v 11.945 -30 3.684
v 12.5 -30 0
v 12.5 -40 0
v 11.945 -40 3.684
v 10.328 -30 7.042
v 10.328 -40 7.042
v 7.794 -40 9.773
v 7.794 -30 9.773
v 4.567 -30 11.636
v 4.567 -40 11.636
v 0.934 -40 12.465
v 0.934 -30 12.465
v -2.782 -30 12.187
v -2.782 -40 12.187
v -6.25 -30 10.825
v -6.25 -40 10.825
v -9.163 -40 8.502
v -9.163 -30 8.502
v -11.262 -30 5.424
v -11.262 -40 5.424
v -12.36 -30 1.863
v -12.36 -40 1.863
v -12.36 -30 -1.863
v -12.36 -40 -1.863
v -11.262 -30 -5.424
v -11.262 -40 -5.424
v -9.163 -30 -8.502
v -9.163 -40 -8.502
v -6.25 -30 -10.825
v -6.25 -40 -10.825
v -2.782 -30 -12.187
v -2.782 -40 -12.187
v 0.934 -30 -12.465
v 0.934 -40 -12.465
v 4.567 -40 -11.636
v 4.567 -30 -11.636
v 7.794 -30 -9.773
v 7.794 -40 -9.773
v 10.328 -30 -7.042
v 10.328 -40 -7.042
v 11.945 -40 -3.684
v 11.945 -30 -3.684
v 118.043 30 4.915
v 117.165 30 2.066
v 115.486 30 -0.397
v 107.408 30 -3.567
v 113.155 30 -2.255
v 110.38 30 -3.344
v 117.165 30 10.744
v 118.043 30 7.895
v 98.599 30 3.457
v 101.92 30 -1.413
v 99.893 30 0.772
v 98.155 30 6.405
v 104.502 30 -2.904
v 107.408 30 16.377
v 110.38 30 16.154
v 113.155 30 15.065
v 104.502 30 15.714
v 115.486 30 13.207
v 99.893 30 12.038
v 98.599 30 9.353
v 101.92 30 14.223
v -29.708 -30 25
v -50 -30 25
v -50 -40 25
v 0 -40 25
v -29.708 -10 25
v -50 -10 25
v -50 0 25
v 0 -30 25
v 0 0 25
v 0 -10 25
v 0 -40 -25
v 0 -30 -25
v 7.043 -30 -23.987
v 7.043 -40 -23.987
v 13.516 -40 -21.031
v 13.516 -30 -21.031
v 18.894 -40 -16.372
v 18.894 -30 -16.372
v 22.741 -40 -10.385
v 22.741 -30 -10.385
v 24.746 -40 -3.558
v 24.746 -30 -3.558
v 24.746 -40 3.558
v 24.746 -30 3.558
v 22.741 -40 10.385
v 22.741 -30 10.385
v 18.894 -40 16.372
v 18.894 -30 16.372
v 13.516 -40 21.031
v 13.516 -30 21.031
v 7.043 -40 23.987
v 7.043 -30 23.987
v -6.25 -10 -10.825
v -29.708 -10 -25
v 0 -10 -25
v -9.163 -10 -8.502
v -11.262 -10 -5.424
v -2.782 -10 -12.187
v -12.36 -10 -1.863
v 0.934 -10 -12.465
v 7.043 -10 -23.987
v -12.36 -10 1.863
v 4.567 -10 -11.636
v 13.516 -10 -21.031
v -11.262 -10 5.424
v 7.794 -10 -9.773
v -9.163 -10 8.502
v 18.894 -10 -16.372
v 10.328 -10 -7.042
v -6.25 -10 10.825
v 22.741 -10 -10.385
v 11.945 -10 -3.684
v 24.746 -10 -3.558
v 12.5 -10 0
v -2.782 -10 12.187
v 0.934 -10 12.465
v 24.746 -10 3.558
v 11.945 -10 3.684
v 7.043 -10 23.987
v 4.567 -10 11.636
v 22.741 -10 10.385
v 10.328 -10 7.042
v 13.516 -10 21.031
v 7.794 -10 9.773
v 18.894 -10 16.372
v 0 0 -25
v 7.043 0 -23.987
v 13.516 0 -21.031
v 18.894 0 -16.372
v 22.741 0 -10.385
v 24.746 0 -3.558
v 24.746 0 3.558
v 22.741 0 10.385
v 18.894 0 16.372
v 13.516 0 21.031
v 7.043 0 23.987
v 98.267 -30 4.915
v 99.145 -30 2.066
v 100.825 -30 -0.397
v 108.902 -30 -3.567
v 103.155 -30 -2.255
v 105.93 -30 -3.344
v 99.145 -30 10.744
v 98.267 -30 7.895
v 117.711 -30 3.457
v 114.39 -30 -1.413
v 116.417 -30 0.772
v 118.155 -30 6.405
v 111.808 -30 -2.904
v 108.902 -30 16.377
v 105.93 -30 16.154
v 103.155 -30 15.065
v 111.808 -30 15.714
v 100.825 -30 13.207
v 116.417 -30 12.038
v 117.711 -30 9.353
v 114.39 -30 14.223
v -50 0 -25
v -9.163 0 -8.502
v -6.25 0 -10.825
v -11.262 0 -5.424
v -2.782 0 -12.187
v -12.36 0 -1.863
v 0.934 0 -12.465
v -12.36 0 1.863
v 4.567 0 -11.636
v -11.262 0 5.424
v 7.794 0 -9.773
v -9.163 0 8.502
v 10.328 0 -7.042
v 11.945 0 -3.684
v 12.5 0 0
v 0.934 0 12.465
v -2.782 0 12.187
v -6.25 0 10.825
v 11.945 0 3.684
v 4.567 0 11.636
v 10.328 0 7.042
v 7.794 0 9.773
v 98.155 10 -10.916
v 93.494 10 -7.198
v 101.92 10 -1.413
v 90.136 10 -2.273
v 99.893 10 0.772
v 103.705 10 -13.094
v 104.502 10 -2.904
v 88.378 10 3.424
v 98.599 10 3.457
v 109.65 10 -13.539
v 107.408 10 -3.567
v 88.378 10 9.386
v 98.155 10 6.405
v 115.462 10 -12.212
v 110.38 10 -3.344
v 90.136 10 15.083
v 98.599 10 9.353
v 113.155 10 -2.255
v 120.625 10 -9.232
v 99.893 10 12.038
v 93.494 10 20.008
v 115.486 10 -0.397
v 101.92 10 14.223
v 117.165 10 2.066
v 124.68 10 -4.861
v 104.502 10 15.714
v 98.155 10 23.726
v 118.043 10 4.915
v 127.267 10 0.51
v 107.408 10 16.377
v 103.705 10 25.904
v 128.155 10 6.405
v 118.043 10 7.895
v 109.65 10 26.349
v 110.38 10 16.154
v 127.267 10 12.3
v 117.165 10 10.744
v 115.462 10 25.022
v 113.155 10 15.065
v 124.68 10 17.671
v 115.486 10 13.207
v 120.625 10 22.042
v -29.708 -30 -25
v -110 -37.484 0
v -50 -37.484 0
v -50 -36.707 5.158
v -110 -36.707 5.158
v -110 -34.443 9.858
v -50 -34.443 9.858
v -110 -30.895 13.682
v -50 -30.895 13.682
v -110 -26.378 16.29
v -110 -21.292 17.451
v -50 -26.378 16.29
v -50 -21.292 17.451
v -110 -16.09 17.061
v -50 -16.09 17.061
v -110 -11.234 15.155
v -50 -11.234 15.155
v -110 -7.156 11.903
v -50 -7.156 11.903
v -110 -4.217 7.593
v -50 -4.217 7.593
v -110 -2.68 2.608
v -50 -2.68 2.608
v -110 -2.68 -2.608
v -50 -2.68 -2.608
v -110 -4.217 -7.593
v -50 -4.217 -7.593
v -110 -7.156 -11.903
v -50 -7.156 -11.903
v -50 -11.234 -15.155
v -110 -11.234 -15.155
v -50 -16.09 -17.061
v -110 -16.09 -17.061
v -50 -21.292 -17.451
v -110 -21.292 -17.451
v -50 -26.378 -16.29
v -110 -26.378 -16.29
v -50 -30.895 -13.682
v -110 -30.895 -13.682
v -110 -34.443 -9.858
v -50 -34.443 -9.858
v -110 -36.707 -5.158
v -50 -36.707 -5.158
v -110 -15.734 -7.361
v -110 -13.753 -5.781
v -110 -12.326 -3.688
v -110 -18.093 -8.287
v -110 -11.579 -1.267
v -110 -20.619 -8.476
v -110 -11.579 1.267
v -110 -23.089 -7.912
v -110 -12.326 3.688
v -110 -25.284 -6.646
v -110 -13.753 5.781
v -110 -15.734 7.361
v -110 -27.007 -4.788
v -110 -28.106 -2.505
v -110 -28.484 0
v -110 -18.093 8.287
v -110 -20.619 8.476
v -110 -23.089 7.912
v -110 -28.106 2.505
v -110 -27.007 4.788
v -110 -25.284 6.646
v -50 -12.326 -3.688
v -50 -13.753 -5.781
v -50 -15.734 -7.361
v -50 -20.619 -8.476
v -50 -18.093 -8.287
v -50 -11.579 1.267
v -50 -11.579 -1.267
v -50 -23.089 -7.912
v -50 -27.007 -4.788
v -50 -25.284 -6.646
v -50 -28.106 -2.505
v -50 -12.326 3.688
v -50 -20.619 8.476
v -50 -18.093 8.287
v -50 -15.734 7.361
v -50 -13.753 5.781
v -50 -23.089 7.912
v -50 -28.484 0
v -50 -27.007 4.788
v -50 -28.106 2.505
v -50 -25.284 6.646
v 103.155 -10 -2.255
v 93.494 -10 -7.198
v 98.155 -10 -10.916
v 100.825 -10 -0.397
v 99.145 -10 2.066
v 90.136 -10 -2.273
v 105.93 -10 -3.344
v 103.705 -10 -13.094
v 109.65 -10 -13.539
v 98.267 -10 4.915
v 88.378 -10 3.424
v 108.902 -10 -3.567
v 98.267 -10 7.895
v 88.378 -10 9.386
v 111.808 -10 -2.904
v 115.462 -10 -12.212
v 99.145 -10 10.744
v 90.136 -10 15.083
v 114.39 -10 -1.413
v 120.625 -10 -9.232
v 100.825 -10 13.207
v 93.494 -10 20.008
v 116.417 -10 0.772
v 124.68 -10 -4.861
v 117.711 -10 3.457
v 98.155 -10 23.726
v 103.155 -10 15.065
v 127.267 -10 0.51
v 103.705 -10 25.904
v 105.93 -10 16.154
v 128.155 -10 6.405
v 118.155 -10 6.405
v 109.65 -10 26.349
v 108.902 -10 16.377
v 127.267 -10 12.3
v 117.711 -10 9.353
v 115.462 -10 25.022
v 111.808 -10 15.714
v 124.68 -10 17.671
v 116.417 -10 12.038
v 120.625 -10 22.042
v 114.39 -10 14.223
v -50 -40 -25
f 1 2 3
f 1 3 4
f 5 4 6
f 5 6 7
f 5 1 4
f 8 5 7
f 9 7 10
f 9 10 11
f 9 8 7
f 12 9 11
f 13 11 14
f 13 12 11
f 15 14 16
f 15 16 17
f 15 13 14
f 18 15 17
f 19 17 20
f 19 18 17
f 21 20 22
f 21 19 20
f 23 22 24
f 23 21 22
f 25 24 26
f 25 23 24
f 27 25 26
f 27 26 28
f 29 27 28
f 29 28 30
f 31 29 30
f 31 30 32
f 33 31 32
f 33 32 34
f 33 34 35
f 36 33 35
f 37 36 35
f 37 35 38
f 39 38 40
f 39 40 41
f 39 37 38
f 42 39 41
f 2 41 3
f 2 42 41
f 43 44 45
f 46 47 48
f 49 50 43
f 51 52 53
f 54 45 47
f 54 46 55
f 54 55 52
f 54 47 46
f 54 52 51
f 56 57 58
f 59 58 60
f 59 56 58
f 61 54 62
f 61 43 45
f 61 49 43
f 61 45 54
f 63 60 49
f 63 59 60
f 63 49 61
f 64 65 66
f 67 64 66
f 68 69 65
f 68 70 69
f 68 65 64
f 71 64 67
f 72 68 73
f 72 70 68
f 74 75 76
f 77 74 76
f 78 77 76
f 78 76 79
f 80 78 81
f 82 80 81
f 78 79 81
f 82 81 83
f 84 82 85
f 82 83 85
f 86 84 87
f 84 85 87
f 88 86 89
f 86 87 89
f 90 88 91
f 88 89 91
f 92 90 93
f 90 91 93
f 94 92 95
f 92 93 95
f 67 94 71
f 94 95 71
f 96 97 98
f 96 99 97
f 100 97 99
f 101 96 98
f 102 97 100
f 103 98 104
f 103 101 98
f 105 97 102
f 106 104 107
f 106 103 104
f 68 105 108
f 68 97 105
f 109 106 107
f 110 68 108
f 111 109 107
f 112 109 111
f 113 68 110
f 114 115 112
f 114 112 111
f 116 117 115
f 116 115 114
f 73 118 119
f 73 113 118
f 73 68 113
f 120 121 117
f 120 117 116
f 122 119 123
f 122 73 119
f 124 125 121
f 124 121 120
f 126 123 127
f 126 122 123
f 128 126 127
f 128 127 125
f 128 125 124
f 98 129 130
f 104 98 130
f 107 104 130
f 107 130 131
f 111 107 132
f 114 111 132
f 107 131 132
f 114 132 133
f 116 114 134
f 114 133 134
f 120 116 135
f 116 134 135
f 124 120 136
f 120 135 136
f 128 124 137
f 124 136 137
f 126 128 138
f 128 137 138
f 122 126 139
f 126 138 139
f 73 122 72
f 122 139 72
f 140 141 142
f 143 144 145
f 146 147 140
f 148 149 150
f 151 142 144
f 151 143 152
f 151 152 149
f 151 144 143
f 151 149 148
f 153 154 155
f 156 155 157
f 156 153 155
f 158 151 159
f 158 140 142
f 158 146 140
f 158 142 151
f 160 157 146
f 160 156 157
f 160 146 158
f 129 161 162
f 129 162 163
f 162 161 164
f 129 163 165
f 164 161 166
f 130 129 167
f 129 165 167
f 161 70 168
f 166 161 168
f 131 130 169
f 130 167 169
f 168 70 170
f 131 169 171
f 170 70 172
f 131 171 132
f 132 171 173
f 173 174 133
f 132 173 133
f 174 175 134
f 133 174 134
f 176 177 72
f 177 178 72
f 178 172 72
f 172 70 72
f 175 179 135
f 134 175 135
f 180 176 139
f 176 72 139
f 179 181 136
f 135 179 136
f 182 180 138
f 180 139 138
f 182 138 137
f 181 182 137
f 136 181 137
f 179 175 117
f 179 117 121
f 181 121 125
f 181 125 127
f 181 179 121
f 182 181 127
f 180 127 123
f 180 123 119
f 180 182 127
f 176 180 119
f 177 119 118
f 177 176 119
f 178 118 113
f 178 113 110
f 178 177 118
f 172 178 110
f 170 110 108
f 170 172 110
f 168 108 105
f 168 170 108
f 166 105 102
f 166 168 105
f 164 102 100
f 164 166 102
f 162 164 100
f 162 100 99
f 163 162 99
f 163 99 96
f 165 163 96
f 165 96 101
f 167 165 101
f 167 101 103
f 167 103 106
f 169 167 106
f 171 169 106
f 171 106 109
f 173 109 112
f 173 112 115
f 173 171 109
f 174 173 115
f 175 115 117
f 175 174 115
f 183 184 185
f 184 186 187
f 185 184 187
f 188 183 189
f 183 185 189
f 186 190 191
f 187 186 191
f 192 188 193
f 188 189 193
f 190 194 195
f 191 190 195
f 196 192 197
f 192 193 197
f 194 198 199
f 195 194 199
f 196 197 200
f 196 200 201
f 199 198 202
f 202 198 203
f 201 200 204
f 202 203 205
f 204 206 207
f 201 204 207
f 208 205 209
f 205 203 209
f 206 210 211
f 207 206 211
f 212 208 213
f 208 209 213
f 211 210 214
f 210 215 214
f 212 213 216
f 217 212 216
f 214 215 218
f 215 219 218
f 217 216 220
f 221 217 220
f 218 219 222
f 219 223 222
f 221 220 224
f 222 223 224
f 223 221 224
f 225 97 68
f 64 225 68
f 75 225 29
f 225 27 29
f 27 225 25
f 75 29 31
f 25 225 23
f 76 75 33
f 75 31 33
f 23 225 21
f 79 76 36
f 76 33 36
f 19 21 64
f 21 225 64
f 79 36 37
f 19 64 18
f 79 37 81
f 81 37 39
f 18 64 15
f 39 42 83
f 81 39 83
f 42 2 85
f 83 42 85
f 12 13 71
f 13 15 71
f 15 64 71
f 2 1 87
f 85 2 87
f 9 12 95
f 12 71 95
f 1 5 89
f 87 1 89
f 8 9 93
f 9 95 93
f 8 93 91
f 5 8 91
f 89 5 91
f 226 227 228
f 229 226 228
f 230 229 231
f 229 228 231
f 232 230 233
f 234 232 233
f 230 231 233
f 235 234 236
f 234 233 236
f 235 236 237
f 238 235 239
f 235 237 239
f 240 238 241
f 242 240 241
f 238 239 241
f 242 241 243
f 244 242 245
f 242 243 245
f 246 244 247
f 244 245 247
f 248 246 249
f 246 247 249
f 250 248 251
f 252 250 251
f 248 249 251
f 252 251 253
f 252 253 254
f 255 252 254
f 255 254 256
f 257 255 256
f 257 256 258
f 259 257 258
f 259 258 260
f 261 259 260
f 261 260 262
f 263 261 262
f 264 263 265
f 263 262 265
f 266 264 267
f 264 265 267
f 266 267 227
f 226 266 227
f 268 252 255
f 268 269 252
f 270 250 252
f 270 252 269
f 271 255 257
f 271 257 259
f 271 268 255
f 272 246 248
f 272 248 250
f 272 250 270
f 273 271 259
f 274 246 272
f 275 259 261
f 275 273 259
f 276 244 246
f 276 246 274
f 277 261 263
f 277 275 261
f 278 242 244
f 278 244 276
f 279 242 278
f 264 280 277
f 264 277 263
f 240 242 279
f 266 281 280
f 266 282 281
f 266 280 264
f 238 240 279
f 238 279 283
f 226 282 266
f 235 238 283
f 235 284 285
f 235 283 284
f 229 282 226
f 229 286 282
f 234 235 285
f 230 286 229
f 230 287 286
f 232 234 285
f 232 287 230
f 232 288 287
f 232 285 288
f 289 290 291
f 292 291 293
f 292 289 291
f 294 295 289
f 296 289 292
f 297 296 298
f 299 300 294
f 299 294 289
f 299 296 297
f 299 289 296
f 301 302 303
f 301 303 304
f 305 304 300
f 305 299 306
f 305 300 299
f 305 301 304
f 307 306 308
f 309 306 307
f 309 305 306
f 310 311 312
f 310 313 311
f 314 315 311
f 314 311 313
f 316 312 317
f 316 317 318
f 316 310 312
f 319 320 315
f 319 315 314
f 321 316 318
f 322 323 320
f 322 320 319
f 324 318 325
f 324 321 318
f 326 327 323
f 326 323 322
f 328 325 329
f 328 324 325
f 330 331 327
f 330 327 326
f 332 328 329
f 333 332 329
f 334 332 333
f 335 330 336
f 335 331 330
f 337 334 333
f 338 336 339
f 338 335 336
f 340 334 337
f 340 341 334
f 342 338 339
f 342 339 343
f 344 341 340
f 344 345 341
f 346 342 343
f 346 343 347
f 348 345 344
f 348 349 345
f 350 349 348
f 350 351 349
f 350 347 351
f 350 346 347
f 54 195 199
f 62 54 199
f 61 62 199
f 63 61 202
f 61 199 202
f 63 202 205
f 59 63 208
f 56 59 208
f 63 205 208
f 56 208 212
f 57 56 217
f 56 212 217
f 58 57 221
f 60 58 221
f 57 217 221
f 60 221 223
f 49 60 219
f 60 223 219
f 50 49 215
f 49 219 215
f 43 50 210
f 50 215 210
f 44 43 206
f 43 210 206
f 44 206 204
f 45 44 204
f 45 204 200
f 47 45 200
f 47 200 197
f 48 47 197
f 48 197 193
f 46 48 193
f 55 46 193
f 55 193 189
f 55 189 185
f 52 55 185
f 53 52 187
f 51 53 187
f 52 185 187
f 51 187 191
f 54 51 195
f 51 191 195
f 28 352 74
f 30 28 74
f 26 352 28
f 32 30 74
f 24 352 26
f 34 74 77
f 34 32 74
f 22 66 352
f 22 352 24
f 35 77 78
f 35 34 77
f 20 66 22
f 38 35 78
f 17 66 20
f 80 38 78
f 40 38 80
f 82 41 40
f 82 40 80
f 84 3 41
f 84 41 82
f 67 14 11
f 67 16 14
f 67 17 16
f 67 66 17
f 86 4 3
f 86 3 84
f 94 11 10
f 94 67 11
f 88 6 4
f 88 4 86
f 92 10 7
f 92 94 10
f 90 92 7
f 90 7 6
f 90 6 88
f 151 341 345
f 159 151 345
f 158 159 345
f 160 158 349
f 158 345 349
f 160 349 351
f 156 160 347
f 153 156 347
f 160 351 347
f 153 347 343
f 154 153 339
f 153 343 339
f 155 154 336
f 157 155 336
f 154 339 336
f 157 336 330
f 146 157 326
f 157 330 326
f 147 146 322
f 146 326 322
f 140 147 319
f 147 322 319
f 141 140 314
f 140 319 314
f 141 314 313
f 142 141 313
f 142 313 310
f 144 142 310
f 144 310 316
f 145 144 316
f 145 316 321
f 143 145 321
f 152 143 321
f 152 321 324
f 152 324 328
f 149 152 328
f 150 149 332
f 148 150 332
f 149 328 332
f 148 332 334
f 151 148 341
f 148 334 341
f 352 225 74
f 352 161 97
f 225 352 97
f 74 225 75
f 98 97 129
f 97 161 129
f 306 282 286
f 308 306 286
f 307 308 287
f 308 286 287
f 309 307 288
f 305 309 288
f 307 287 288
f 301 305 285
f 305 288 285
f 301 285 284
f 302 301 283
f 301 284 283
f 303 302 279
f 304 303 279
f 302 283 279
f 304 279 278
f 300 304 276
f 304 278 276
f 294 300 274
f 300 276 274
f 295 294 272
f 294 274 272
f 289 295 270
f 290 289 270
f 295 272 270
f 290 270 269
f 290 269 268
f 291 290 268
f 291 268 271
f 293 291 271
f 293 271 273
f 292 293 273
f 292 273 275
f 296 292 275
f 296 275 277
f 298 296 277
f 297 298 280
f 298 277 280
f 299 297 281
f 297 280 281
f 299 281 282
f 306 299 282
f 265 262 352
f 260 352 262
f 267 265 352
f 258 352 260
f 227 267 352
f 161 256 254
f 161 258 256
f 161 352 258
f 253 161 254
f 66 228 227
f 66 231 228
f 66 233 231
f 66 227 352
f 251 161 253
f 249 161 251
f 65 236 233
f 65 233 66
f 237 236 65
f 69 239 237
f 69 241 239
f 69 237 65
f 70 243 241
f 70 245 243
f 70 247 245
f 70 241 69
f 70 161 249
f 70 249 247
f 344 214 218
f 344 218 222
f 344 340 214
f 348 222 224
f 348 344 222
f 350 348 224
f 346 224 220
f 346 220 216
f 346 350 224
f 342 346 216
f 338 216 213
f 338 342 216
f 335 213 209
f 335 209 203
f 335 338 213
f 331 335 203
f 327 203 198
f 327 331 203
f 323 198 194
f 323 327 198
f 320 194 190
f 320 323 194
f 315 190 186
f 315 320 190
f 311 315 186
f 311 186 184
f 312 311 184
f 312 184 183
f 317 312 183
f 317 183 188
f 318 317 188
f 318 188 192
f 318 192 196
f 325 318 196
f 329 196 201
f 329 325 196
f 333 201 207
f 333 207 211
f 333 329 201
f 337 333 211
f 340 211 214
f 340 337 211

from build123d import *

# Parameters (mm, degrees)
F0_R           = 12.5
F1_DEPTH       = 10
F3_R           = 12.5
F4_DEPTH       = 10
F5_W           = 20.2915735543
F5_H           = 50
F6_DEPTH       = 20
F7_R           = 17.5
F8_DEPTH       = 60
F9_R           = 8.5
F10_DEPTH      = 60
F11_R          = 20
F12_DEPTH      = 10
F12_DEPTH_BACK = 10
F13_R          = 10
F14_DEPTH      = 20
F15_R          = 10
F16_DEPTH      = 20


with BuildPart() as f1:
    # F0 (on Front) → F1 (new body)
    with BuildSketch(Plane.XZ):
        with BuildLine():
            Line((-50, -25), (0, -25))
            ThreePointArc((0, -25), (25, 0), (0, 25))
            Line((0, 25), (-50, 25))
            Line((-50, 25), (-50, -25))
        make_face()
        Circle(F0_R, mode=Mode.SUBTRACT)
    extrude(amount=F1_DEPTH)



with BuildPart() as f4:
    # F3 (on offset) → F4 (new body)
    with BuildSketch(Plane.XZ.offset(30)):
        with BuildLine():
            Line((0, 25), (-50, 25))
            Line((-50, 25), (-50, -25))
            Line((-50, -25), (0, -25))
            ThreePointArc((0, -25), (25, 0), (0, 25))
        make_face()
        Circle(F3_R, mode=Mode.SUBTRACT)
    extrude(amount=F4_DEPTH)


with BuildPart() as f1_1:
    add(f1.part)

    add(f4.part)  # F6 merges F4
    # F5 (on face) → F6 (join, through all)
    with BuildSketch(Plane.XZ.offset(10)):
        with Locations((-39.8542132229, 0)):
            Rectangle(F5_W, F5_H)
    extrude(amount=F6_DEPTH)

    # F7 (on face) → F8 (join)
    with BuildSketch(Plane(origin=(-50, 0, 0), x_dir=(0, -1, 0), z_dir=(-1, 0, 0))):
        with Locations((19.9840664864, 0)):
            Circle(F7_R)
    extrude(amount=F8_DEPTH)

    # F9 (on face) → F10 (cut)
    with BuildSketch(Plane(origin=(-110, 0, 0), x_dir=(0, -1, 0), z_dir=(-1, 0, 0))):
        with Locations((19.9840664864, 0)):
            Circle(F9_R)
    extrude(amount=-F10_DEPTH, mode=Mode.SUBTRACT)


with BuildPart() as f12:
    # F11 (on Front) → F12 (new body, two sides)
    with BuildSketch(Plane.XZ) as f12_sk:
        with Locations((108.1550717354, 6.4049987122)):
            Circle(F11_R)
    extrude(amount=F12_DEPTH)
    extrude(f12_sk.sketch, amount=-F12_DEPTH_BACK)

    # F13 (on face) → F14 (join)
    with BuildSketch(Plane.XZ.offset(10)):
        with Locations((108.1550717354, 6.4049987122)):
            Circle(F13_R)
    extrude(amount=F14_DEPTH)

    # F15 (on face) → F16 (join)
    with BuildSketch(Plane(origin=(0, 10, 0), x_dir=(-1, 0, 0), z_dir=(0, 1, 0))):
        with Locations((-108.1550717354, 6.4049987122)):
            Circle(F15_R)
    extrude(amount=F16_DEPTH)


solid = Compound([f1_1.part, f12.part])
